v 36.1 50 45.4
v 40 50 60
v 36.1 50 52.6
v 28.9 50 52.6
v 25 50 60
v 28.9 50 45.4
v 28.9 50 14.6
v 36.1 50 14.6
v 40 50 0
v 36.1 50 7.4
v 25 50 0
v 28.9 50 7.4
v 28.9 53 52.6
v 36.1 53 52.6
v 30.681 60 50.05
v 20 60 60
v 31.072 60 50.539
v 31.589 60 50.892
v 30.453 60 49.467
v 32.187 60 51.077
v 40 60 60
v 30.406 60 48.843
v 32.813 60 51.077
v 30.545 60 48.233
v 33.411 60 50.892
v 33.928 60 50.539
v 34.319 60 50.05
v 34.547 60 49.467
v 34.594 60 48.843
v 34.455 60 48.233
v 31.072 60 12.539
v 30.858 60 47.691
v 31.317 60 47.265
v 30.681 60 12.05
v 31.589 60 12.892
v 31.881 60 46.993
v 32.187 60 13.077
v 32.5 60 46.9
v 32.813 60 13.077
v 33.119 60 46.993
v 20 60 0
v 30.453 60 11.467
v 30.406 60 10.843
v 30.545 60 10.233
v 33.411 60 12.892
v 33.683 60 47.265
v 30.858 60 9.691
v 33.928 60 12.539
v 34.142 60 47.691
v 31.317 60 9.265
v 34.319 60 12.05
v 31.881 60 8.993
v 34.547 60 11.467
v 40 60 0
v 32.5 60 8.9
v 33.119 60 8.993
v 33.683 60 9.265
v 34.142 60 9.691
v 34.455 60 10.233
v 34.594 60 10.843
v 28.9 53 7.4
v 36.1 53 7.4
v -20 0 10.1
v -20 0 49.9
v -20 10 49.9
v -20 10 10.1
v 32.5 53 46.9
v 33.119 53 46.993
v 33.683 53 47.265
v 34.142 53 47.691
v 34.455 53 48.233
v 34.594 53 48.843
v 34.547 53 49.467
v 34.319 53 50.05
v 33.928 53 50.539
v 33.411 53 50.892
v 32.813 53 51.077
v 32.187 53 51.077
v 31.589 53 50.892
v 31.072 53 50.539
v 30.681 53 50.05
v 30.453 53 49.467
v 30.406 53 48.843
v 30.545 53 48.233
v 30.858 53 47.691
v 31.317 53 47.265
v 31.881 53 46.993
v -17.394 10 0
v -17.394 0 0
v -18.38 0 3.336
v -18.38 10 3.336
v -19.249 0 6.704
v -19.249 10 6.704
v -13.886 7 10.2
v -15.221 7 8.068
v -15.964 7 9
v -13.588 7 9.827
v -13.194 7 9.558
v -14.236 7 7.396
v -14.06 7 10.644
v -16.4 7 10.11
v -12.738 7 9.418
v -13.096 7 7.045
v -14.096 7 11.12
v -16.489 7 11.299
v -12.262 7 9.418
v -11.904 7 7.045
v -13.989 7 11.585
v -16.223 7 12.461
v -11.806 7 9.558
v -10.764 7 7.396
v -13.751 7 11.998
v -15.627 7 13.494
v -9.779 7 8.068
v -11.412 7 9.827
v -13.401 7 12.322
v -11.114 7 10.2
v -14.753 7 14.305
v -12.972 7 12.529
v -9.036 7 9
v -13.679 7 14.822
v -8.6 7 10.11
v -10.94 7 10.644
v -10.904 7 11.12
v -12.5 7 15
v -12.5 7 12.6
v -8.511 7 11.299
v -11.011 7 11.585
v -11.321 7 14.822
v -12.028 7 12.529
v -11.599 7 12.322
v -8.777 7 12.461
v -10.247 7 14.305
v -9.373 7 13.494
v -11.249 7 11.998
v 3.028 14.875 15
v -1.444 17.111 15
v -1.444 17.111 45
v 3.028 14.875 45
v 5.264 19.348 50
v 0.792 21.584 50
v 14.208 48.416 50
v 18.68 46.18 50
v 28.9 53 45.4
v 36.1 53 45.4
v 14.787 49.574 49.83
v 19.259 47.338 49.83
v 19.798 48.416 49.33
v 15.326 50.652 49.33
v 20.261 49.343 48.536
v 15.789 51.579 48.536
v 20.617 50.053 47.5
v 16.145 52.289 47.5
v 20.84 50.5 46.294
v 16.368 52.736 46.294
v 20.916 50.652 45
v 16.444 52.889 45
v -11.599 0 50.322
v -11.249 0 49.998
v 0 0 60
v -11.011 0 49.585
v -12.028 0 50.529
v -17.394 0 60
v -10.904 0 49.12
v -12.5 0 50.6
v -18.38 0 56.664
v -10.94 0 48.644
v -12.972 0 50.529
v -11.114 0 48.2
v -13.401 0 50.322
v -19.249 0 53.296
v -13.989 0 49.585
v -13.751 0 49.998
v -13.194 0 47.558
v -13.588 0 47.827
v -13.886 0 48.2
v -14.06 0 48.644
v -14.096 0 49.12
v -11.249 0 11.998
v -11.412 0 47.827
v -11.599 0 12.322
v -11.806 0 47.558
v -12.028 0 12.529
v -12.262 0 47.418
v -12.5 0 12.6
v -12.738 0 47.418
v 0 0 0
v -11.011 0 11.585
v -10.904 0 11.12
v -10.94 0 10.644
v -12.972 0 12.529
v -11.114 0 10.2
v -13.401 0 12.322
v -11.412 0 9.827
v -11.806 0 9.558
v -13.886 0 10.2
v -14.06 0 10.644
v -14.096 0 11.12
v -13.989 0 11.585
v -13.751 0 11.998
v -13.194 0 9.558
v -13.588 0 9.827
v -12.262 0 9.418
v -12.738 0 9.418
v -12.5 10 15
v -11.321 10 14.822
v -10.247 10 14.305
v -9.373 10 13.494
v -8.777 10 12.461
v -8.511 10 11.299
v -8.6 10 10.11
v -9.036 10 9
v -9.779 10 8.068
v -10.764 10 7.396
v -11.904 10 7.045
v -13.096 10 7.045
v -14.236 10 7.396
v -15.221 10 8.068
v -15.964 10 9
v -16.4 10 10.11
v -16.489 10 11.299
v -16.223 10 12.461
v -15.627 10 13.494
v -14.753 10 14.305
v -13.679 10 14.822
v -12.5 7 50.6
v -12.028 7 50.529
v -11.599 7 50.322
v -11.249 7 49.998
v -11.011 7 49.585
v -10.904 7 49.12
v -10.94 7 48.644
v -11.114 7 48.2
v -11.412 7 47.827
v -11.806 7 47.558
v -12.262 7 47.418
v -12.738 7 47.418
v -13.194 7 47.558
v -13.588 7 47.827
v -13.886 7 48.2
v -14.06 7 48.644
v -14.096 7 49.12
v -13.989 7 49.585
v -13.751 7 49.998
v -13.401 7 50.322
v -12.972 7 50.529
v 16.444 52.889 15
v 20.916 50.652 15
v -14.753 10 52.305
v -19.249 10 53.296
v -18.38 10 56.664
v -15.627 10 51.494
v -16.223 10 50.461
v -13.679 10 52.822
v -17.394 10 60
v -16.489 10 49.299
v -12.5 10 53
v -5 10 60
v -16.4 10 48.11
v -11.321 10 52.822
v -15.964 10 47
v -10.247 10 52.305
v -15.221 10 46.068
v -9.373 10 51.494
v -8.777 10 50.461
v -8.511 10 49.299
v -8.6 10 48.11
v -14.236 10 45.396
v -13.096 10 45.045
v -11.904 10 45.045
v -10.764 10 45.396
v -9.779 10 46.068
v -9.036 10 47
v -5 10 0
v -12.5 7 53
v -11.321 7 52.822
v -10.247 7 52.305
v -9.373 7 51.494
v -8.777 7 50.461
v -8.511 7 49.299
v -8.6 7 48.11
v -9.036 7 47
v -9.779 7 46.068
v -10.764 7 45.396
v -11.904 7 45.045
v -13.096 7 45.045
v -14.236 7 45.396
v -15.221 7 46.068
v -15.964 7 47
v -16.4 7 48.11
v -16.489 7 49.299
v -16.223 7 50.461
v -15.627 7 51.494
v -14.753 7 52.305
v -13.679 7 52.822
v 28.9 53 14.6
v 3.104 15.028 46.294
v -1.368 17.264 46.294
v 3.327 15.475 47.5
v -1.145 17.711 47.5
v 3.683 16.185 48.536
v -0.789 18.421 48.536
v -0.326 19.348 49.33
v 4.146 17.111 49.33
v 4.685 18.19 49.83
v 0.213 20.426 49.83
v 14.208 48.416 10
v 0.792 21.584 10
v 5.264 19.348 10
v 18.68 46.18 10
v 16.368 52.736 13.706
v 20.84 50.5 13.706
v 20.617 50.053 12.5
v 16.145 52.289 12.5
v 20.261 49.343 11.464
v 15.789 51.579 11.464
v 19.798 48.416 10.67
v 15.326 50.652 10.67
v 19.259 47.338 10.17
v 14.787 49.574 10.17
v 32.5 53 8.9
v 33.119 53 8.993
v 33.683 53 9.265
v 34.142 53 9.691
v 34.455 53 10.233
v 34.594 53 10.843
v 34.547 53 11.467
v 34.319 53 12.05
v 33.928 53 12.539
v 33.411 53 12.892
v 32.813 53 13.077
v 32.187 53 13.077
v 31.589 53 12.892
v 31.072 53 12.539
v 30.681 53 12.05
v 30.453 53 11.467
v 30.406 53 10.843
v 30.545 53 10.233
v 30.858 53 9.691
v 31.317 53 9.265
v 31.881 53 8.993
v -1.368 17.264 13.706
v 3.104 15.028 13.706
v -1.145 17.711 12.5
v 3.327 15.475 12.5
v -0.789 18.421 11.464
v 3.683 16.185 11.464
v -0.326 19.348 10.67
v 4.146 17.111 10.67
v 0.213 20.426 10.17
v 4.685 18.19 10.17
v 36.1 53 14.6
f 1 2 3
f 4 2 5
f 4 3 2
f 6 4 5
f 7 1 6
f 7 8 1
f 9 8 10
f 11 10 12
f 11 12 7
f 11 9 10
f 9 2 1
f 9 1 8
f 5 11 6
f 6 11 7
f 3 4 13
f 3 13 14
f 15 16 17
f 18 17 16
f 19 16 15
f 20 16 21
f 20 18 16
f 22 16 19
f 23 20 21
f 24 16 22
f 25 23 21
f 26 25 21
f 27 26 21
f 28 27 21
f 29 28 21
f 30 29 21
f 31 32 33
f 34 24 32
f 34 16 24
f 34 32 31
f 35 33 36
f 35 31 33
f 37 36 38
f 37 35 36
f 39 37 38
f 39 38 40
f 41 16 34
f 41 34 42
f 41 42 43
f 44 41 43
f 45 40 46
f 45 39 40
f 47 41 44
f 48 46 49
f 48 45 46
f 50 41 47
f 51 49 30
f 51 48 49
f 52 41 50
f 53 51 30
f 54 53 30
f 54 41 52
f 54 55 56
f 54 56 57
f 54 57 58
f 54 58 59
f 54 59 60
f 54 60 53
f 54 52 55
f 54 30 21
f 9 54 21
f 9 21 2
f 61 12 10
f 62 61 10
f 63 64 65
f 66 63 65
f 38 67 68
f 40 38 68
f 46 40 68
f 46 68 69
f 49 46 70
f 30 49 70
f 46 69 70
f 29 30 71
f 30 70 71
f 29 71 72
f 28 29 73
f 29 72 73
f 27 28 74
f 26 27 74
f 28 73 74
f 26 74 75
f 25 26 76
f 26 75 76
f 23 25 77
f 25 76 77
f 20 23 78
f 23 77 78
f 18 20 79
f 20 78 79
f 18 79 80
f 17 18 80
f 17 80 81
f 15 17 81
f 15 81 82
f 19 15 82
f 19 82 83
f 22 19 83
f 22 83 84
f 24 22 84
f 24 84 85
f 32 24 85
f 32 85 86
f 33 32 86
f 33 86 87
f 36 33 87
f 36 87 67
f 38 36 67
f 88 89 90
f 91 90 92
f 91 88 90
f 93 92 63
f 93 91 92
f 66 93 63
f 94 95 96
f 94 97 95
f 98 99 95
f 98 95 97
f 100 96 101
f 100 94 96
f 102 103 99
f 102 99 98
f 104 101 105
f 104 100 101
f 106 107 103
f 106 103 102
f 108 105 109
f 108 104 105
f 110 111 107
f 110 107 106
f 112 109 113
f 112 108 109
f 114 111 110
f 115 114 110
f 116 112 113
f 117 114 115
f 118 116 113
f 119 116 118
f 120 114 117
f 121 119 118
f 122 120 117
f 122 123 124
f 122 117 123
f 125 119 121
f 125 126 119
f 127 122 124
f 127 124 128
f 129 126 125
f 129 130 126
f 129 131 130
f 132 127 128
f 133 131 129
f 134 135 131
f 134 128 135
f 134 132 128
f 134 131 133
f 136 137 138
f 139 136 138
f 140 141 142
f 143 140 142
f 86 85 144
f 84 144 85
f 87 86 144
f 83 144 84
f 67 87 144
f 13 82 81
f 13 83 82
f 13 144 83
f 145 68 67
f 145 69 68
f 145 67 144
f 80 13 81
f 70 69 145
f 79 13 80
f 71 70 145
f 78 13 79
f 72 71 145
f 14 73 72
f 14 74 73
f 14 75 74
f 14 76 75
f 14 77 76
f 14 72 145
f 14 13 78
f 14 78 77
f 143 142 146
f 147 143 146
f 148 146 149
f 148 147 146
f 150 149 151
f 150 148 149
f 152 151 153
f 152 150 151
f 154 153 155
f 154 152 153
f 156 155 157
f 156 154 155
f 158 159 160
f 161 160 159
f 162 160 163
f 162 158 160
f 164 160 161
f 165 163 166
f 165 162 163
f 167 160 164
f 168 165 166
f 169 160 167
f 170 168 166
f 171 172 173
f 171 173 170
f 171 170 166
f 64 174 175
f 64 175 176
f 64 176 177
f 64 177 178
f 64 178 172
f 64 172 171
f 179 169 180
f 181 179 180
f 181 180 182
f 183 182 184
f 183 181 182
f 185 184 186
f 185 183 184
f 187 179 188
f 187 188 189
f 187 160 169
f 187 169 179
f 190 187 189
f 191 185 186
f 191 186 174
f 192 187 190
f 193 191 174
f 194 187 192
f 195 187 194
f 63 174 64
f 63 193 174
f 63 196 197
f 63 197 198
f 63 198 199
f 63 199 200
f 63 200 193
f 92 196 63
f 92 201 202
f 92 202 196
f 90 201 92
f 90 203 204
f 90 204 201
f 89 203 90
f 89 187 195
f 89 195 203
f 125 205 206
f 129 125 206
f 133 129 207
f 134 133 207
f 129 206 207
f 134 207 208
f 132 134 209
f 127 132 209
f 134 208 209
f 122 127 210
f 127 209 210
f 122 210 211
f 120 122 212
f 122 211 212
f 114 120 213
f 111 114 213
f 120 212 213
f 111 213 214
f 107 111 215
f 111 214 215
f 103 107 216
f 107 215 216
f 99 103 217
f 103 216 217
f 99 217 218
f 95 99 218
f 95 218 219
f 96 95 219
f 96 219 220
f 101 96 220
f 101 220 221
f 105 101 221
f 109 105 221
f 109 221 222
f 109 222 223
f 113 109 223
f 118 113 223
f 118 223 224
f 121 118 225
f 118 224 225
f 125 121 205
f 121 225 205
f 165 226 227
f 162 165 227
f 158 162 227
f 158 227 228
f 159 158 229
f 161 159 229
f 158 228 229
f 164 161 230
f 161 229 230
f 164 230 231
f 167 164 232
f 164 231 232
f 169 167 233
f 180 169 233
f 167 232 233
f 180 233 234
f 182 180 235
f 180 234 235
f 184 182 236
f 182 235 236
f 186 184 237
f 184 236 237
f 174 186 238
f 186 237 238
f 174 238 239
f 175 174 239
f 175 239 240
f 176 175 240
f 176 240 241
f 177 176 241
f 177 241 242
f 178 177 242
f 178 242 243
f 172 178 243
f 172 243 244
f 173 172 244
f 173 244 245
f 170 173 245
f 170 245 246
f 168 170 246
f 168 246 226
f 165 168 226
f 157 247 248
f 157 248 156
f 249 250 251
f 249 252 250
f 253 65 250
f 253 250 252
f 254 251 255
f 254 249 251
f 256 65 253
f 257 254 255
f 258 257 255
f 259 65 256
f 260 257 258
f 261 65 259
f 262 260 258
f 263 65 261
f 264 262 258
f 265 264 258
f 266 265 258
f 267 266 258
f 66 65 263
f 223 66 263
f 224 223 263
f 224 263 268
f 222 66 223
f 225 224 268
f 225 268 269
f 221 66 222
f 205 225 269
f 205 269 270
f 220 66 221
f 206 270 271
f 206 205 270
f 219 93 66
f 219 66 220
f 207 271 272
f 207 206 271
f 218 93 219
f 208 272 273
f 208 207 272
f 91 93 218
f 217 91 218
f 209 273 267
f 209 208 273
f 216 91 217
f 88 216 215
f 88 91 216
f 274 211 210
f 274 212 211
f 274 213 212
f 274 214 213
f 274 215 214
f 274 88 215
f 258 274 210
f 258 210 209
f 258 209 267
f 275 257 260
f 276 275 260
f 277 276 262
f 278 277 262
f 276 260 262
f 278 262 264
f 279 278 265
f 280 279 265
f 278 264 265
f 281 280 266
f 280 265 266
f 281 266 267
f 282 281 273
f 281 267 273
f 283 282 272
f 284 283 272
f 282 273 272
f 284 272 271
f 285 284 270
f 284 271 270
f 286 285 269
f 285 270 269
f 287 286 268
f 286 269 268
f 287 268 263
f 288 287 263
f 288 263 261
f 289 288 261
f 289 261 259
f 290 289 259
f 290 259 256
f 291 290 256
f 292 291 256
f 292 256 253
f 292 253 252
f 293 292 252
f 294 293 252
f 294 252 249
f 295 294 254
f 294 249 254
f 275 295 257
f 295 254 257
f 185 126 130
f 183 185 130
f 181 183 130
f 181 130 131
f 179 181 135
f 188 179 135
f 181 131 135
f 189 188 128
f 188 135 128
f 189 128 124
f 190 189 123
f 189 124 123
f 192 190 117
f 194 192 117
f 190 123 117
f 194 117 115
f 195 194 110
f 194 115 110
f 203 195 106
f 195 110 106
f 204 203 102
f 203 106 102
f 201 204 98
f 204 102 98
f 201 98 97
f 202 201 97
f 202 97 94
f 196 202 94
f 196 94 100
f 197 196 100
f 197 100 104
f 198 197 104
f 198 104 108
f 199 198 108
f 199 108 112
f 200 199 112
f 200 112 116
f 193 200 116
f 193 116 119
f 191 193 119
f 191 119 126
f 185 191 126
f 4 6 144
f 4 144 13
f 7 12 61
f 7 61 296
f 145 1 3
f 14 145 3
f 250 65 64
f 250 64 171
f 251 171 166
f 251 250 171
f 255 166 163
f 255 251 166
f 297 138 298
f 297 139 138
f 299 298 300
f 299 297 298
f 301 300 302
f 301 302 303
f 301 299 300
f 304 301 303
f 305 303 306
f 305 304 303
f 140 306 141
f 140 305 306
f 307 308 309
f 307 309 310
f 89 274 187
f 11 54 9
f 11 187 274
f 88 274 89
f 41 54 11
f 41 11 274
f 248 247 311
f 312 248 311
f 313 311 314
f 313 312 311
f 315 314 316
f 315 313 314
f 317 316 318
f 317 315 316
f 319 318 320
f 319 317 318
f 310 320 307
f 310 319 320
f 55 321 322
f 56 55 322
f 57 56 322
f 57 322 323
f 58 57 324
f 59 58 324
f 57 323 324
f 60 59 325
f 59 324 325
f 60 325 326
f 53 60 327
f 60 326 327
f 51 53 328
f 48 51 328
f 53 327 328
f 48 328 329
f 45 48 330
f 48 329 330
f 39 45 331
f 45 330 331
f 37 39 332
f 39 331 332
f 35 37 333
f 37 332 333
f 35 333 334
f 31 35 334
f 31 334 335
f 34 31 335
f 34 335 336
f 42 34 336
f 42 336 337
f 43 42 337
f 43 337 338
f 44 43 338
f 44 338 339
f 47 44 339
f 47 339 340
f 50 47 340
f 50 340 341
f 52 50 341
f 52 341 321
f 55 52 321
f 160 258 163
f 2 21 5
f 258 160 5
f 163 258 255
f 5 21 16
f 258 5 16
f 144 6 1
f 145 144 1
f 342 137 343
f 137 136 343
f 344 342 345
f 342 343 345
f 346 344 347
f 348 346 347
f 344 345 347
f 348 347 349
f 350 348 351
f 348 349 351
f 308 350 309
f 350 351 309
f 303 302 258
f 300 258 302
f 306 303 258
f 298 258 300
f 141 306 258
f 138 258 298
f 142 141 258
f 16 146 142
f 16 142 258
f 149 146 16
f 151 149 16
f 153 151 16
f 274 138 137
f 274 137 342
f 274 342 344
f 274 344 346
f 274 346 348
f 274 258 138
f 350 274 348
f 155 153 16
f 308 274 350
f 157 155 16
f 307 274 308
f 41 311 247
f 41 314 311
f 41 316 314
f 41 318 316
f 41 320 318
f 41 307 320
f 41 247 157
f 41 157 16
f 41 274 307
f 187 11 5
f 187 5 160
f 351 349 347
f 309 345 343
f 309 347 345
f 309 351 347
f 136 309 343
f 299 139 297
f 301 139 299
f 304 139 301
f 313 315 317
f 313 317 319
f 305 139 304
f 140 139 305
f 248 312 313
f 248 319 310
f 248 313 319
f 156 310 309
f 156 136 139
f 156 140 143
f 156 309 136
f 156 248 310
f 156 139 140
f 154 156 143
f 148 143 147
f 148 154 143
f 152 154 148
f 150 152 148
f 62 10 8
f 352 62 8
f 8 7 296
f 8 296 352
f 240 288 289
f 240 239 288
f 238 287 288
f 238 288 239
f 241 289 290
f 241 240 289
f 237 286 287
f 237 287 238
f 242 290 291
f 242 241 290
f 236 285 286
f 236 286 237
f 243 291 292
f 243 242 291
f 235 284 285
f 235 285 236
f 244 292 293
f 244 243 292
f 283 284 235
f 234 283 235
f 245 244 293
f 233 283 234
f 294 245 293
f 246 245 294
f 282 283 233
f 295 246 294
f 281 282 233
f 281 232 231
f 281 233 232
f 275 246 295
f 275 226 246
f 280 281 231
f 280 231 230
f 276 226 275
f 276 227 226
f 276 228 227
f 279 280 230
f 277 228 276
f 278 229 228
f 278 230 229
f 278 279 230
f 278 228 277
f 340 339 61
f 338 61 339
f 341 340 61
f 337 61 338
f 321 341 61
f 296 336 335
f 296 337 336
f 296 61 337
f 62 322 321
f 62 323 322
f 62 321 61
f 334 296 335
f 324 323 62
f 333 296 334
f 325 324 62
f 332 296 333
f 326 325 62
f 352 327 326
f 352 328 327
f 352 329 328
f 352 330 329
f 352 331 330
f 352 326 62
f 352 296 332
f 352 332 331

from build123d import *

# Parameters (mm, degrees)
EXTRUDE_1_DEPTH     = 60
SKETCH_2_R          = 171.976759521
SKETCH_2_R_2        = 100
CUT_EXTRUDE_1_DEPTH = 60
SKETCH_3_W          = 40
SKETCH_3_H          = 40
CUT_EXTRUDE_2_DEPTH = 5
FILLET_1_R          = 5
SKETCH_4_R          = 1.6
CUT_EXTRUDE_3_DEPTH = 10
SKETCH_5_R          = 4
CUT_EXTRUDE_4_DEPTH = 3
SKETCH_6_R          = 2.1
CUT_EXTRUDE_5_DEPTH = 88.749643874
SKETCH_7_W          = 7.2
SKETCH_7_H          = 7.2
CUT_EXTRUDE_6_DEPTH = 3


with BuildPart() as part:
    # 草图1 → 凸台-拉伸1 (new body)
    with BuildSketch(Plane.XY):
        Polygon((0, 0), (-20, 0), (-20, 10), (-5, 10), (20, 60), (40, 60), (40, 50), (25, 50), align=None)
    extrude(amount=EXTRUDE_1_DEPTH)

    # 草图2 → 切除-拉伸1 (cut)
    with BuildSketch(Plane(origin=(0, 10, 0), x_dir=(1, 0, 0), z_dir=(0, 1, 0))):
        with Locations((78, -30)):
            Circle(SKETCH_2_R)
        with Locations((78, -30)):
            Circle(SKETCH_2_R_2, mode=Mode.SUBTRACT)
    extrude(amount=-CUT_EXTRUDE_1_DEPTH, mode=Mode.SUBTRACT)

    # 草图3 → 切除-拉伸2 (cut)
    with BuildSketch(Plane(origin=(-8, 4, 0), x_dir=(0, 0, 1), z_dir=(-0.894427190999916, 0.4472135954999579, 0))):
        with Locations((30, 34.659053651)):
            Rectangle(SKETCH_3_W, SKETCH_3_H)
    extrude(amount=-CUT_EXTRUDE_2_DEPTH, mode=Mode.SUBTRACT)

    # 圆角1
    fillet_1_edges = [part.edges().sort_by_distance(p)[0] for p in [
        (18.680339887, 51.770509831, 50),
        (0.791796068, 15.993422191, 50),
        (0.791796068, 15.993422191, 10),
        (18.680339887, 51.770509831, 10),
    ]]
    fillet(fillet_1_edges, radius=FILLET_1_R)

    # 草图4 → 切除-拉伸3 (cut)
    with BuildSketch(Plane(origin=(0, 10, 0), x_dir=(1, 0, 0), z_dir=(0, 1, 0))):
        with Locations(Location((-12.5, -49, 0), (0, 0, 270))):
            Circle(SKETCH_4_R)
        with Locations(Location((-12.5, -11, 0), (0, 0, 270))):
            Circle(SKETCH_4_R)
    extrude(amount=-CUT_EXTRUDE_3_DEPTH, mode=Mode.SUBTRACT)

    # 草图5 → 切除-拉伸4 (cut)
    with BuildSketch(Plane(origin=(0, 10, 0), x_dir=(1, 0, 0), z_dir=(0, 1, 0))):
        with Locations(Location((-12.5, -49, 0), (0, 0, 270))):
            Circle(SKETCH_5_R)
        with Locations(Location((-12.5, -11, 0), (0, 0, 270))):
            Circle(SKETCH_5_R)
    extrude(amount=-CUT_EXTRUDE_4_DEPTH, mode=Mode.SUBTRACT)

    # 草图6 → 切除-拉伸5 (cut, through all)
    with BuildSketch(Plane.XZ.offset(-50)):
        with Locations(Location((32.5, 11, 0), (0, 0, 270))):
            Circle(SKETCH_6_R)
        with Locations(Location((32.5, 49, 0), (0, 0, 270))):
            Circle(SKETCH_6_R)
    extrude(amount=-CUT_EXTRUDE_5_DEPTH, mode=Mode.SUBTRACT)

    # 草图7 → 切除-拉伸6 (cut)
    with BuildSketch(Plane.XZ.offset(-50)):
        with Locations((32.5, 11)):
            Rectangle(SKETCH_7_W, SKETCH_7_H)
        with Locations((32.5, 49)):
            Rectangle(SKETCH_7_W, SKETCH_7_H)
    extrude(amount=-CUT_EXTRUDE_6_DEPTH, mode=Mode.SUBTRACT)


solid = part.part
